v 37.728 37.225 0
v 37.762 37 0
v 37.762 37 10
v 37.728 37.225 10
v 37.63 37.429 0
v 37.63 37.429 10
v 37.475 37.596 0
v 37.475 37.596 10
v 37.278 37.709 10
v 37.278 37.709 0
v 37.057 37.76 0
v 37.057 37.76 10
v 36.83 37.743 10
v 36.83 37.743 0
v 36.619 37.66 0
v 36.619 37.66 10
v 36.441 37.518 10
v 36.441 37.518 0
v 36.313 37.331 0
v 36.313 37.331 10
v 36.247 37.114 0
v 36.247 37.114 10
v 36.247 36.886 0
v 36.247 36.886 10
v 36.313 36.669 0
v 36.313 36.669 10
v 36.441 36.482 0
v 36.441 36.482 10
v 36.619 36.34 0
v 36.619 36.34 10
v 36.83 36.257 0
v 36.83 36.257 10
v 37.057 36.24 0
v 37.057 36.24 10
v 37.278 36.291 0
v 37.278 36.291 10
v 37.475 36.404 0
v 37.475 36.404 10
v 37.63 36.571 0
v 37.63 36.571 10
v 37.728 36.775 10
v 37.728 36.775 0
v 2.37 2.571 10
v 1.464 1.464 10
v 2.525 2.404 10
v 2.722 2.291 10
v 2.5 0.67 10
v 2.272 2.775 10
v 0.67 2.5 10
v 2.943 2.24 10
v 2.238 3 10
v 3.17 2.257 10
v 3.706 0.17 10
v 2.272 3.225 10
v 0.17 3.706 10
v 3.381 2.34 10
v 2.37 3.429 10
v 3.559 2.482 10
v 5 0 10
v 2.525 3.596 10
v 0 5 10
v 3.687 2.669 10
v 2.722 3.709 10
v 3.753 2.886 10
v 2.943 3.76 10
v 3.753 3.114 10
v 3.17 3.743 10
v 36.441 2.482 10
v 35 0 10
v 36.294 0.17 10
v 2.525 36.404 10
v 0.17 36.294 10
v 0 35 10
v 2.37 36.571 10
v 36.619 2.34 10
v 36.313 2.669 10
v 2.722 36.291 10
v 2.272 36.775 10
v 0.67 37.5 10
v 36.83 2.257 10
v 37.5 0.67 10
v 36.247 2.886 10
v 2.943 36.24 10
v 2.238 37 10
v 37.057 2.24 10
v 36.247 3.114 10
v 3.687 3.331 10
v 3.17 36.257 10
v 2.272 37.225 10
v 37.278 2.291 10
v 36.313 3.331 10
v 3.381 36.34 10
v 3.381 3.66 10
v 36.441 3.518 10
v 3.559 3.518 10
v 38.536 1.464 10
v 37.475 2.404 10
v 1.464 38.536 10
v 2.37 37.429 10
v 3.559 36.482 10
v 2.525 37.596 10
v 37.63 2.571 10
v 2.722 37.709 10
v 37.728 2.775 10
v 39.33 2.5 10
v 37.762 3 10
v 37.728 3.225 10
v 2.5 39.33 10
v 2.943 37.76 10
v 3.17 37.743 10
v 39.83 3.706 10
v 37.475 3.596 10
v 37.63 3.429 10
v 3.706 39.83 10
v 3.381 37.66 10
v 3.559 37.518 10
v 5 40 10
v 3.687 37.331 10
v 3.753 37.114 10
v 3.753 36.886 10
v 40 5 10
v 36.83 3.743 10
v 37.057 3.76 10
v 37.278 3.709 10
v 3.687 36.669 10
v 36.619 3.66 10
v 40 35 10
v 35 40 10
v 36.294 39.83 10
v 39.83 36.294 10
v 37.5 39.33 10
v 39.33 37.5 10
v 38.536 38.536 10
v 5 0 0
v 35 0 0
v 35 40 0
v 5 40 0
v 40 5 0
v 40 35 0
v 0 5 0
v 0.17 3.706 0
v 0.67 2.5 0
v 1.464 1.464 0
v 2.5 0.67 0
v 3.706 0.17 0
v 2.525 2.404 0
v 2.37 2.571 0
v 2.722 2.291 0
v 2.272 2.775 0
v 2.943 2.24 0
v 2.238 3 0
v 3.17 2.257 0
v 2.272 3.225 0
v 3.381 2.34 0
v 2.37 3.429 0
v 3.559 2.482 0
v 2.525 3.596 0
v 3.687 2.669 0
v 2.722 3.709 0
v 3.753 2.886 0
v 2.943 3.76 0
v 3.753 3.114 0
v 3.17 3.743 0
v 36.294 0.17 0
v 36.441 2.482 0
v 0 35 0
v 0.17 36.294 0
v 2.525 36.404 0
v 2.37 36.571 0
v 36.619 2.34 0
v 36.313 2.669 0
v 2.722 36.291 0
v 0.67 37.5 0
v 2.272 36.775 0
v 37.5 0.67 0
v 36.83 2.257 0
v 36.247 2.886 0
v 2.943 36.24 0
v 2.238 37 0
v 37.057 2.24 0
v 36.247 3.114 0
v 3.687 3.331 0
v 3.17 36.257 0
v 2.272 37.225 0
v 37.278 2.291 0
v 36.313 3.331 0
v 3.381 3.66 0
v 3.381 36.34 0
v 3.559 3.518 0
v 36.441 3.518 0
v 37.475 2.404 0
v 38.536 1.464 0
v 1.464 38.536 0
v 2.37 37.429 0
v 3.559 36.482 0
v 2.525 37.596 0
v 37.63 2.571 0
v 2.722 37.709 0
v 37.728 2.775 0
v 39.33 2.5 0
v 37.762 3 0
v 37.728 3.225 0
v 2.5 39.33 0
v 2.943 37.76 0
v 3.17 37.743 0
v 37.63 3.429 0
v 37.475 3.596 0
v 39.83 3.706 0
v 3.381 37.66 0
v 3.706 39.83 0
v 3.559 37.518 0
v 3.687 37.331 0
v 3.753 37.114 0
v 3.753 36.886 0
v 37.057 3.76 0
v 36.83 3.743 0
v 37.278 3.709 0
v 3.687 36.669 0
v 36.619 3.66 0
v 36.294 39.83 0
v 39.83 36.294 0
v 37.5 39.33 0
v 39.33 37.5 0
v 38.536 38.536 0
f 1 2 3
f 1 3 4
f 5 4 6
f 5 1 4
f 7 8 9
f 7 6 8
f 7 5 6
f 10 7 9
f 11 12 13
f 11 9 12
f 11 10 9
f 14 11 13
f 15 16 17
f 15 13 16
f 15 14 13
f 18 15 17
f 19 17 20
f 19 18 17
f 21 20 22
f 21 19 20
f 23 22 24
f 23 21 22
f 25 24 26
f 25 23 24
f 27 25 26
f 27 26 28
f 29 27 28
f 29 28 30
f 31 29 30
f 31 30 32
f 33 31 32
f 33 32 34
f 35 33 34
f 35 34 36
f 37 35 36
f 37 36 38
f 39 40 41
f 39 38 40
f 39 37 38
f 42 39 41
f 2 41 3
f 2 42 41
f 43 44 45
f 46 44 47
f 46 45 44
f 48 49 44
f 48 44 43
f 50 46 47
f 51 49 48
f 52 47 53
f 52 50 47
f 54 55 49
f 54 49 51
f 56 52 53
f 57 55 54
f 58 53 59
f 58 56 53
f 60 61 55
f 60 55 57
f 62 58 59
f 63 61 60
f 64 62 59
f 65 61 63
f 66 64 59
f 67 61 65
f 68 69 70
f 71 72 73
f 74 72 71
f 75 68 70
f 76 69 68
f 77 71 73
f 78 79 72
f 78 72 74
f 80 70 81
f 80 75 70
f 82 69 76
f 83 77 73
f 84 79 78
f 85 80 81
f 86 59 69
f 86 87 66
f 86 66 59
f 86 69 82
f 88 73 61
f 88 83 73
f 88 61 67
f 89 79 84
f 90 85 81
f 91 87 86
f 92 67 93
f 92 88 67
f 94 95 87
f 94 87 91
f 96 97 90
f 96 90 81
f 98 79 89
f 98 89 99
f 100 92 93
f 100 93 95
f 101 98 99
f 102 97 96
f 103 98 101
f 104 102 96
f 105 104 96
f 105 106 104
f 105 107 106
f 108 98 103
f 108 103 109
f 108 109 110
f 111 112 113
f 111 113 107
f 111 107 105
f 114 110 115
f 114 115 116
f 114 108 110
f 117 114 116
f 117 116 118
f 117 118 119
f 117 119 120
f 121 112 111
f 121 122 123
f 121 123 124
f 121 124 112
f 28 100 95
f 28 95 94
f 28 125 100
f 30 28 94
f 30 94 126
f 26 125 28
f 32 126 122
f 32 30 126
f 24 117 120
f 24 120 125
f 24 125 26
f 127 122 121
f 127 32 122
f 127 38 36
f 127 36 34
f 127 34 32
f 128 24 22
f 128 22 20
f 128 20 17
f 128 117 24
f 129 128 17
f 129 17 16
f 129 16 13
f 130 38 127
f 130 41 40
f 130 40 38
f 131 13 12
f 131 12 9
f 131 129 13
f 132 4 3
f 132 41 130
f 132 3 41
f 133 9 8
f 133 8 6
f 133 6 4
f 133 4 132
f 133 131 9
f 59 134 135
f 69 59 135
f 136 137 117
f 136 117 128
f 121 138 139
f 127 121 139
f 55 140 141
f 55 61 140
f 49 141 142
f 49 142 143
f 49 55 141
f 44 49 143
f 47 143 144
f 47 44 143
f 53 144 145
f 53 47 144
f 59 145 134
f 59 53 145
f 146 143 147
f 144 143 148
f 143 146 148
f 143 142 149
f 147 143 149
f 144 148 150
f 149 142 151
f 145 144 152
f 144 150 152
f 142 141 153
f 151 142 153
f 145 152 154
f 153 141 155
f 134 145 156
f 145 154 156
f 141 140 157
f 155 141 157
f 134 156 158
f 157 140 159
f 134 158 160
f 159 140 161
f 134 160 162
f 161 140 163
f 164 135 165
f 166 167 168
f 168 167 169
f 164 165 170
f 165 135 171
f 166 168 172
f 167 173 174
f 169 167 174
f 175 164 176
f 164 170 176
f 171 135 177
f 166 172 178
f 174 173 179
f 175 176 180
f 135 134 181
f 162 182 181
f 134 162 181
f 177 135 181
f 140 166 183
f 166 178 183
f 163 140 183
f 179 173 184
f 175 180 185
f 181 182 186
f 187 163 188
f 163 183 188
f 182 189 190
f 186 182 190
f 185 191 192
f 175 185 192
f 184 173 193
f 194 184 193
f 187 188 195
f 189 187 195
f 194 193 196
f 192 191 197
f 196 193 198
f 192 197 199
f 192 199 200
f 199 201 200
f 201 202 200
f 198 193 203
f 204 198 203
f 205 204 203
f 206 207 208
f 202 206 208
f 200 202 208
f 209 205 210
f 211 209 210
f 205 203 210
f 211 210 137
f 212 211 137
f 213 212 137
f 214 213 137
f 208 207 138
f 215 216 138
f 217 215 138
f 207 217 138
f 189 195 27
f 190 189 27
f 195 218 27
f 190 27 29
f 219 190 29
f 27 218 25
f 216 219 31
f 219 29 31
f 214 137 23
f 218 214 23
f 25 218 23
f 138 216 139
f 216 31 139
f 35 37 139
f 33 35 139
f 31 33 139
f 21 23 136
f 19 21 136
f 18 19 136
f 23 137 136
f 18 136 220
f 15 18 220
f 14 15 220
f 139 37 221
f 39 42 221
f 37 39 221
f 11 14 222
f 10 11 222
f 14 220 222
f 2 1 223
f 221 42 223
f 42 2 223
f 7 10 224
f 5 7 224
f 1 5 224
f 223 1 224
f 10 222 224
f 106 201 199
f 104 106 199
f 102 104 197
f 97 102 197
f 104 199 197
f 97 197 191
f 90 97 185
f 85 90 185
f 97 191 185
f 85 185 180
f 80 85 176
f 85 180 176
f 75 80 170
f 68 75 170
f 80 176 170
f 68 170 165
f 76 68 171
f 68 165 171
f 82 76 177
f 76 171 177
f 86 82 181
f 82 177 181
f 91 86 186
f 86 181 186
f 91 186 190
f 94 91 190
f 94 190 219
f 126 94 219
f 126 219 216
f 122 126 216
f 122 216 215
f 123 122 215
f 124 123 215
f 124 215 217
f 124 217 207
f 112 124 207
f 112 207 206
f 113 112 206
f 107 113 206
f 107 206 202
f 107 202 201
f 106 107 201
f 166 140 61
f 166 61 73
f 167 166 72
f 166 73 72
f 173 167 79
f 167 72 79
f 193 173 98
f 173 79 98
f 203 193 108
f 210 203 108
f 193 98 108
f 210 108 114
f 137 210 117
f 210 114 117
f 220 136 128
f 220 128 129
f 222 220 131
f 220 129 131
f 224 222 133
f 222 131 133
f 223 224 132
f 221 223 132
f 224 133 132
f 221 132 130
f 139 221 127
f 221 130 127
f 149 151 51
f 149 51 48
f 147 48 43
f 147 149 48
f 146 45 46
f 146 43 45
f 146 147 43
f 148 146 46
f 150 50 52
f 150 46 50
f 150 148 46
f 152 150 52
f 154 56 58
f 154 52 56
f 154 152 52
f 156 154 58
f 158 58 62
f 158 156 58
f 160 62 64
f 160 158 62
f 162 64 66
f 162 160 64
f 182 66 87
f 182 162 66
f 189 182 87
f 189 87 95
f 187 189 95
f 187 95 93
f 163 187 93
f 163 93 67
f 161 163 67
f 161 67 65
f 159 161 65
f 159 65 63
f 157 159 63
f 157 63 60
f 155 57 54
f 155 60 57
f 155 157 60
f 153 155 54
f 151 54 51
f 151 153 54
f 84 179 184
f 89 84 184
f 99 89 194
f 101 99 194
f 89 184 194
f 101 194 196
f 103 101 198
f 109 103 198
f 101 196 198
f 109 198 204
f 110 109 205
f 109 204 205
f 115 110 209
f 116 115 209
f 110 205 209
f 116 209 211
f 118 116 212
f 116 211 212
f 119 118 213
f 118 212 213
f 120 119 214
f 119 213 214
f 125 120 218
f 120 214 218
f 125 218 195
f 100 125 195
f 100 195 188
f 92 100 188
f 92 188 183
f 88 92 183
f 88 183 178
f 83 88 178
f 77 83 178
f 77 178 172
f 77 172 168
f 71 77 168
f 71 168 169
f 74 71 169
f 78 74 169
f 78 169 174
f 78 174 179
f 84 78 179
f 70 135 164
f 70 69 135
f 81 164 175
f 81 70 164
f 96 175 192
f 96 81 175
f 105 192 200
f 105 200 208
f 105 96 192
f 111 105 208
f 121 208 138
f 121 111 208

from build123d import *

# Parameters (mm, degrees)
SKETCH1_W             = 40
SKETCH1_H             = 40
BOSS_EXTRUDE1_DEPTH   = 10
F_3_0MM_DOWEL_HOLE1_D = 1.524
MIRROR2_COPY_1_D      = 1.524
FILLET1_R             = 5


with BuildPart() as part:
    # Sketch1 → Boss-Extrude1 (new body)
    with BuildSketch(Plane.XY):
        with Locations((20, 20)):
            Rectangle(SKETCH1_W, SKETCH1_H)
    extrude(amount=BOSS_EXTRUDE1_DEPTH)

    # Ø3.0mm Dowel Hole1 (through all)
    with Locations(Plane.XY.offset(10)):
        with Locations((3, 37)):
            f_3_0mm_dowel_hole1 = Hole(F_3_0MM_DOWEL_HOLE1_D / 2)

    # Mirror1: Ø3.0mm Dowel Hole1 across plane
    add(f_3_0mm_dowel_hole1.mirror(Plane.ZY.offset(-20)), mode=Mode.SUBTRACT)

    # Mirror2: Ø3.0mm Dowel Hole1 across plane
    add(f_3_0mm_dowel_hole1.mirror(Plane.ZX.offset(20)), mode=Mode.SUBTRACT)

    # Mirror2 copy 1 (through all)
    with Locations(Plane(origin=(40, 40, 10), x_dir=(-1, 0, 0), z_dir=(0, 0, 1))):
        with Locations((3, 37)):
            Hole(MIRROR2_COPY_1_D / 2)

    # Fillet1
    fillet1_edges = [part.edges().sort_by_distance(p)[0] for p in [
        (0, 40, 5),
        (40, 40, 5),
        (40, 0, 5),
        (0, 0, 5),
    ]]
    fillet(fillet1_edges, radius=FILLET1_R)


solid = part.part
